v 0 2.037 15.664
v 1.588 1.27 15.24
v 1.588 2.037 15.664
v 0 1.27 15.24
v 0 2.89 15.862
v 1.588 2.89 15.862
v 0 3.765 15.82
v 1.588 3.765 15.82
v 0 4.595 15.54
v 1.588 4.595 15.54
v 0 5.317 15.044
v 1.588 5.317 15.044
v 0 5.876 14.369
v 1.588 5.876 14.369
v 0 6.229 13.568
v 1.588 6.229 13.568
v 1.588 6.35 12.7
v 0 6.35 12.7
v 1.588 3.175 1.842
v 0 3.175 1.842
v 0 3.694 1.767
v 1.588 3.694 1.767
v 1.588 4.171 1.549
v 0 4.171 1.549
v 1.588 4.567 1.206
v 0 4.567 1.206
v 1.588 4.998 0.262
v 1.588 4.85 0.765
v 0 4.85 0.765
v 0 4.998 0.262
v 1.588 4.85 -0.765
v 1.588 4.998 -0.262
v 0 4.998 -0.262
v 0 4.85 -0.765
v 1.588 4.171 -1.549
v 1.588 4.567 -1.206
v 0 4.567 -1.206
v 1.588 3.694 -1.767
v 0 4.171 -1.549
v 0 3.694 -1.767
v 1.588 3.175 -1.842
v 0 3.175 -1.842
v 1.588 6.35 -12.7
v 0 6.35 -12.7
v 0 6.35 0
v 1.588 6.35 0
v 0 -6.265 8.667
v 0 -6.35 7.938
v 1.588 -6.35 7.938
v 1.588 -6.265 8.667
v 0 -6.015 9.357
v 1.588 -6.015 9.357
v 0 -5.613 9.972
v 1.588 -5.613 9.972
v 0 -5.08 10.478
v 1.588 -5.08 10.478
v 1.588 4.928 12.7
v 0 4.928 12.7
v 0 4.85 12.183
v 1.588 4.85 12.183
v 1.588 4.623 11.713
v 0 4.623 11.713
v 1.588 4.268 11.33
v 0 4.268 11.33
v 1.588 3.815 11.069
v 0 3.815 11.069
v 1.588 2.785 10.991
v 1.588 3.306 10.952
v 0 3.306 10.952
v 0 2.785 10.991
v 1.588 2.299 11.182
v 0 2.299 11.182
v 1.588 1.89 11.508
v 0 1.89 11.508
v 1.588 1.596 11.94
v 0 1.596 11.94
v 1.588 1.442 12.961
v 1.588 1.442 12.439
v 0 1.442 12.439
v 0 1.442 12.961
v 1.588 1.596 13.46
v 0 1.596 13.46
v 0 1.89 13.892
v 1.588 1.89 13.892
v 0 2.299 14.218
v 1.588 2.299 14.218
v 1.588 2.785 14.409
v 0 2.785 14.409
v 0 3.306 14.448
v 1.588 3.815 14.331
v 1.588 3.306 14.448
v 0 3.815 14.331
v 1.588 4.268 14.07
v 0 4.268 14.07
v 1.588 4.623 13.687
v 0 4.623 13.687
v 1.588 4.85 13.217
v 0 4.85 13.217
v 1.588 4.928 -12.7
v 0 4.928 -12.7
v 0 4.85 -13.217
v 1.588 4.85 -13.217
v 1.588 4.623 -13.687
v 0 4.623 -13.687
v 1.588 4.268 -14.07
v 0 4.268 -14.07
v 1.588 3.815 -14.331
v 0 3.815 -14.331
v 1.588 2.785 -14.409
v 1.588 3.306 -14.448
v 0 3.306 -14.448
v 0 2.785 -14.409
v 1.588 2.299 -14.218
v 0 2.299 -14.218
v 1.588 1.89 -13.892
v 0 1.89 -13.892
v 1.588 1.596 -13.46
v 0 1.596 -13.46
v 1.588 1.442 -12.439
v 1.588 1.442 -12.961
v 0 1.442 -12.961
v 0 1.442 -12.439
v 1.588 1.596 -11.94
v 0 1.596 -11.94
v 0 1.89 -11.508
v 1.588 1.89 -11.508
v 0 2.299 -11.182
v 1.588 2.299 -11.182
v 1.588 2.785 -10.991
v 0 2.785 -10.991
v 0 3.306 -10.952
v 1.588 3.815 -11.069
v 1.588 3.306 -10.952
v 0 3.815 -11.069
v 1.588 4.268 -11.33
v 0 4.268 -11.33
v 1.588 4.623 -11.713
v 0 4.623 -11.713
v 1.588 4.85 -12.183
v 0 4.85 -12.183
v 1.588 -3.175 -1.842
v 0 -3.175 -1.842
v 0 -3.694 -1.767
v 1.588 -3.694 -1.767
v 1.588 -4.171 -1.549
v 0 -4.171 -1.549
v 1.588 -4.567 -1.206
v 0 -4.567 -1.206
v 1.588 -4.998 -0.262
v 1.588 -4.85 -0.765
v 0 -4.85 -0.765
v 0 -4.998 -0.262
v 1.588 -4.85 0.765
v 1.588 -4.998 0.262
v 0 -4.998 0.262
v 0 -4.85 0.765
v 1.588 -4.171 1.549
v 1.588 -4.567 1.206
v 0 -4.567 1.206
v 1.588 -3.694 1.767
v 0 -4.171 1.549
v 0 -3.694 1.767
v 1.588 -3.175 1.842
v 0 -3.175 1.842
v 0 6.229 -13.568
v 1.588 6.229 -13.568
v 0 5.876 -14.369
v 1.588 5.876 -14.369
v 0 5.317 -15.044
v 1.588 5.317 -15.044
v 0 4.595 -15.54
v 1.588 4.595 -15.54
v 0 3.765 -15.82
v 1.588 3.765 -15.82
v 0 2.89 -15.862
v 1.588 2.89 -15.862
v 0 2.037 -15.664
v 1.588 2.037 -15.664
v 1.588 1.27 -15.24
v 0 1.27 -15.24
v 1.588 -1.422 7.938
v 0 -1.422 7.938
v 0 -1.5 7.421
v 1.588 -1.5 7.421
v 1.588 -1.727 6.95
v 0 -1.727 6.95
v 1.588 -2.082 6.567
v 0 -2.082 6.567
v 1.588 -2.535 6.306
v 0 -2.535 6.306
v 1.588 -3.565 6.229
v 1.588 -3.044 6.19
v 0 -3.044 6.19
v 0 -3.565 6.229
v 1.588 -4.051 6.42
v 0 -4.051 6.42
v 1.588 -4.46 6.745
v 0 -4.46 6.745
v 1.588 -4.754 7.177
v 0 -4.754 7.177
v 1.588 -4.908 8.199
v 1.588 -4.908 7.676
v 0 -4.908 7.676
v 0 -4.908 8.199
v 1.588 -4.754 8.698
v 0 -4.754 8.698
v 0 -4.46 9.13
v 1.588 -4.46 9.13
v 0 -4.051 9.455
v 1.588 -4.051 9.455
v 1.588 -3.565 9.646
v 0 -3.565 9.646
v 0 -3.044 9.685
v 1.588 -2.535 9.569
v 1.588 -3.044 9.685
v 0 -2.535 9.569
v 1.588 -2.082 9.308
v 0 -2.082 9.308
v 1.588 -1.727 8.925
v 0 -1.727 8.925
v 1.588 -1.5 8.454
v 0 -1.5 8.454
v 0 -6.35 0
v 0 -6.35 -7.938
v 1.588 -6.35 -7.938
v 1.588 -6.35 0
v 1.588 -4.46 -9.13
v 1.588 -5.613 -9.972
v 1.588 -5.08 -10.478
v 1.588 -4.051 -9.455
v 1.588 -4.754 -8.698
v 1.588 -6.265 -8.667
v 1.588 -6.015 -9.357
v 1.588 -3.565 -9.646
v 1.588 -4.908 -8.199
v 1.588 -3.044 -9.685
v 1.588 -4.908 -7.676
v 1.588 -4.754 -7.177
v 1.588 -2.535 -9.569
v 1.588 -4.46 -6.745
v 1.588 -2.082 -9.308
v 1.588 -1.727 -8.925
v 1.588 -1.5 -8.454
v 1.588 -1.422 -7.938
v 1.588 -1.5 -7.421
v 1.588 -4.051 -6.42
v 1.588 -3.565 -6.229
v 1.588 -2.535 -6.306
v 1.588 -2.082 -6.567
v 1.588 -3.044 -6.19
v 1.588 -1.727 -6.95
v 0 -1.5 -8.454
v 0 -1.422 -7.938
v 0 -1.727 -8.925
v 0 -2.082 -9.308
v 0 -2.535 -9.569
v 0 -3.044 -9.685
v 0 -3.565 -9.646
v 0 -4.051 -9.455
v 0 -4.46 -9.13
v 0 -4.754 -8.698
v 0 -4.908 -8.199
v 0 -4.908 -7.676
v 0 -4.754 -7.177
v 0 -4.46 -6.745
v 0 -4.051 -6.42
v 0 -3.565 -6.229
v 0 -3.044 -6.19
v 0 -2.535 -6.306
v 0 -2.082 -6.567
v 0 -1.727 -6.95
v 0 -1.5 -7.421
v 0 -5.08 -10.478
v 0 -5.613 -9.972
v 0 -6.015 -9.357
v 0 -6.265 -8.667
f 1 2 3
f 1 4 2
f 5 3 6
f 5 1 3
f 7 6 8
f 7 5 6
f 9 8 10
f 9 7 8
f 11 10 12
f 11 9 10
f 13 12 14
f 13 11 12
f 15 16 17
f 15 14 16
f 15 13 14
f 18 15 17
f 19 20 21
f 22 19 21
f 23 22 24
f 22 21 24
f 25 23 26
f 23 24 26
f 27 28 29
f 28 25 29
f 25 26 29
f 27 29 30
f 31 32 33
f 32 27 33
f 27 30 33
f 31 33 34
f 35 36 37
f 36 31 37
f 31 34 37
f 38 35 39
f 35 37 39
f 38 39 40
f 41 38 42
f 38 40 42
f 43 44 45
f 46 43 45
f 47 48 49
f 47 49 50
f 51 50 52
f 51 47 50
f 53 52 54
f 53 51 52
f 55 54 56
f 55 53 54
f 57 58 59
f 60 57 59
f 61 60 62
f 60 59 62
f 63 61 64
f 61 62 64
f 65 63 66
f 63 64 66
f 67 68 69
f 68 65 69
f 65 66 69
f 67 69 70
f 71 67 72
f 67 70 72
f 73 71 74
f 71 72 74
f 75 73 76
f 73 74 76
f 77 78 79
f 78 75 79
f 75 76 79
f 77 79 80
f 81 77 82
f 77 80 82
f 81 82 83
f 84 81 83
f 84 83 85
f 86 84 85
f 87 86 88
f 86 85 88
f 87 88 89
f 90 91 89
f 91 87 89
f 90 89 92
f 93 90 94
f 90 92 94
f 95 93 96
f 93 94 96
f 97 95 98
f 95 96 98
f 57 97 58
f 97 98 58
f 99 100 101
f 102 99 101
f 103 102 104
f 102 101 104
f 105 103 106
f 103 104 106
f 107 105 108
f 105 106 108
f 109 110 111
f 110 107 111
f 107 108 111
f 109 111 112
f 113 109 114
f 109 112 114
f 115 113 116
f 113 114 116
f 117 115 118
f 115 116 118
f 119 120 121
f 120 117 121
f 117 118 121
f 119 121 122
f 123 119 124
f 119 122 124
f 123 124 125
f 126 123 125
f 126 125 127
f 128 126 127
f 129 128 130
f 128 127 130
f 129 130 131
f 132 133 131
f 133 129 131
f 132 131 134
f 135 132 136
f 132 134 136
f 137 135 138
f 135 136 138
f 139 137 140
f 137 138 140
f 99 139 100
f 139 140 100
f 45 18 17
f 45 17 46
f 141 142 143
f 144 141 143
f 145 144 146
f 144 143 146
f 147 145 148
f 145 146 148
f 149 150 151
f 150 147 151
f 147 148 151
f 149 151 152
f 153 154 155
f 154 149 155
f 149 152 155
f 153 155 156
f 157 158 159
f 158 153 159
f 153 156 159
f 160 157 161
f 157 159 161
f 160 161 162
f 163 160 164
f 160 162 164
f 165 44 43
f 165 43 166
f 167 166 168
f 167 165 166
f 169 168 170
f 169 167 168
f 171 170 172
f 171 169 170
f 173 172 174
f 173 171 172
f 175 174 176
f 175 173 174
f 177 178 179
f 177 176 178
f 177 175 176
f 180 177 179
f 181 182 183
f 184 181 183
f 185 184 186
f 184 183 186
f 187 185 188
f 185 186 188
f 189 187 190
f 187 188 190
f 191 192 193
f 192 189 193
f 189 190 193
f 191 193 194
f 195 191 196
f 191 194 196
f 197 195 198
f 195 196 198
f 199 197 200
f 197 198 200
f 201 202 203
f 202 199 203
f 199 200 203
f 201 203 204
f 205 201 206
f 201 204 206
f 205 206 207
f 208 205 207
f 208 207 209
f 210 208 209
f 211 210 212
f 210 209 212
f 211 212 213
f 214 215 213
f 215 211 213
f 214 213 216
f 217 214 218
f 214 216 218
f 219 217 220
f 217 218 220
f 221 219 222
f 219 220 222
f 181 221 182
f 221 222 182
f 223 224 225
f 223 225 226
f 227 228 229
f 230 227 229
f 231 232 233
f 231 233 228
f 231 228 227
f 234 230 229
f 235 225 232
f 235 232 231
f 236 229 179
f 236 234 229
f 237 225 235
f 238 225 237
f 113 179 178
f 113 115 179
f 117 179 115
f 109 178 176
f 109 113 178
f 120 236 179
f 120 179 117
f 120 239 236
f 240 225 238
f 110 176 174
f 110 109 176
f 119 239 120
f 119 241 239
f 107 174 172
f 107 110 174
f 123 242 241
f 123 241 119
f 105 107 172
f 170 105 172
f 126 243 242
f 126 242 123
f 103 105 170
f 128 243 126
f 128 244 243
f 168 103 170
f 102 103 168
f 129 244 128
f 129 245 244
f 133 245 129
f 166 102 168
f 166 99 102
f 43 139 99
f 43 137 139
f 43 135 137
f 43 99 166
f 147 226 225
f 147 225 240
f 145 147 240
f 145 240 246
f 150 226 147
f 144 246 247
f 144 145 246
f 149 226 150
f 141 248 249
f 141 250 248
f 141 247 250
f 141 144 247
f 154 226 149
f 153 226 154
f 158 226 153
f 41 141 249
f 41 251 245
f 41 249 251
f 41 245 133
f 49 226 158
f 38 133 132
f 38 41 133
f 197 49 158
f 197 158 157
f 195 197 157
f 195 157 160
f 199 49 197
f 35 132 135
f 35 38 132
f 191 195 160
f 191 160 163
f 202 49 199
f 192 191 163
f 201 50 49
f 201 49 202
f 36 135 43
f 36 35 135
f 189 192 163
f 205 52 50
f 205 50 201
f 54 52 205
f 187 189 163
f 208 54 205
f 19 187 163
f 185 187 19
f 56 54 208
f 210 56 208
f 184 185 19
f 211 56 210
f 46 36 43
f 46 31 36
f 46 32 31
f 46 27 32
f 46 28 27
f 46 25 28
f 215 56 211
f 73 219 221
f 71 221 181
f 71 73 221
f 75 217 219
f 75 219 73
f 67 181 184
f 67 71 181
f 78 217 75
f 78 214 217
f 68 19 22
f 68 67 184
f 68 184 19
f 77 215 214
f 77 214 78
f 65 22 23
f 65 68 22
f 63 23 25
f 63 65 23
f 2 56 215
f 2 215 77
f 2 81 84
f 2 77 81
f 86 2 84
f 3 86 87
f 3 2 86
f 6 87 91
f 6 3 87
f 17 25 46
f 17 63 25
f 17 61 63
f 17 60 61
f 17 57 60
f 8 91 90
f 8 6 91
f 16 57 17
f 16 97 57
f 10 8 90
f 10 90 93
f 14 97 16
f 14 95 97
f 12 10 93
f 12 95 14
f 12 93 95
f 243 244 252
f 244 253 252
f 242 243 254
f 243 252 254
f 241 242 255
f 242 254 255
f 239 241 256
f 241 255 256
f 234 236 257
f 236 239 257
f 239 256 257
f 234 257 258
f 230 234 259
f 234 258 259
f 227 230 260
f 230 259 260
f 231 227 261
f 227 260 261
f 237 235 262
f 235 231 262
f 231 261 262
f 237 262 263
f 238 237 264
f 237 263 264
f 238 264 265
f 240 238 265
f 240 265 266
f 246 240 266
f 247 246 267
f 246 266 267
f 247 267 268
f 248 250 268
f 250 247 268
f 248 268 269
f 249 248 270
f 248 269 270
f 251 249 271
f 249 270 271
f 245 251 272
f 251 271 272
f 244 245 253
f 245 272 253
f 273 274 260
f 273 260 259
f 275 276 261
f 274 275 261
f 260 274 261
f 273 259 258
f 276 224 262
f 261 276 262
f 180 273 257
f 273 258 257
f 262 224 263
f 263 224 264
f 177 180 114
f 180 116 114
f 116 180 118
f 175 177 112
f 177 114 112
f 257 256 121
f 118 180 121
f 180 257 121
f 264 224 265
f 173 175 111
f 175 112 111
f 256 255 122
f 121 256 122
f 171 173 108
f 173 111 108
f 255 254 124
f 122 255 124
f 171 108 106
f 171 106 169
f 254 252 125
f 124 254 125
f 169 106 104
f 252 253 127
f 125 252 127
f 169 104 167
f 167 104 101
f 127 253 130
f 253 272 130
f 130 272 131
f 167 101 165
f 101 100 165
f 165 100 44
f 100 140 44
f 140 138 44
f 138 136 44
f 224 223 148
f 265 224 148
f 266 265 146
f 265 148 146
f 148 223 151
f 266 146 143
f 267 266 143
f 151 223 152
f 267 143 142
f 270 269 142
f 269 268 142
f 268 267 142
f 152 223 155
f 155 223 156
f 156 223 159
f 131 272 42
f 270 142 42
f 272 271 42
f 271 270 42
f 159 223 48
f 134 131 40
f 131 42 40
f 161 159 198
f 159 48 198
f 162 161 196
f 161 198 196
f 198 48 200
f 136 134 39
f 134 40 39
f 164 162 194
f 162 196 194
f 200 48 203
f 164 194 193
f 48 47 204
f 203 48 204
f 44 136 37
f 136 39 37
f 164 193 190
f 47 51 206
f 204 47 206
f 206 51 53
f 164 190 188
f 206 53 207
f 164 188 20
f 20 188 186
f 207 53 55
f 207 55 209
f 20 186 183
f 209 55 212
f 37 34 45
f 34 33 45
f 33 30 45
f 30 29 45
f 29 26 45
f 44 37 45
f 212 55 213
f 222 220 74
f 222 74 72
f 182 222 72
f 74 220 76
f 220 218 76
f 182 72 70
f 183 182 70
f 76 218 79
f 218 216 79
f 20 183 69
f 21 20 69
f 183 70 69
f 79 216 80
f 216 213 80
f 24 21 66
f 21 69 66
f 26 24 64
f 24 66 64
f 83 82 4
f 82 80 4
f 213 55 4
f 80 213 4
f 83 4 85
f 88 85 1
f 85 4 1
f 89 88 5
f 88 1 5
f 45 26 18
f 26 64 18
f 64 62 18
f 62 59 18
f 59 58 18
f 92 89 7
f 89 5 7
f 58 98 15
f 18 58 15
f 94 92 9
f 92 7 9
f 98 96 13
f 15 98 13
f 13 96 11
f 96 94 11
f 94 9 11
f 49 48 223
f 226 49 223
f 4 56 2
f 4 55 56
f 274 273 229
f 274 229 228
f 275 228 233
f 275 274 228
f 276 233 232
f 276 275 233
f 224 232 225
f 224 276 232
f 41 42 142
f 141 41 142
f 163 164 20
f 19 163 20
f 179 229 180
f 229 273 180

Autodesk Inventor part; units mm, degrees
ref_plane "YZ Plane" through (0, 0, 0) normal (1, 0, 0) x (0, 1, 0)
ref_plane "XZ Plane" through (0, 0, 0) normal (0, 1, 0) x (-1, 0, 0)
ref_plane "XY Plane" through (0, 0, 0) normal (0, 0, 1) x (1, 0, 0)
sketch "Sketch1" plane through (0, 0, 0) normal (1, 0, 0) x (0, 1, 0)
  line L0 (3.175, 0) -> (-3.175, 0) construction
  line L1 (3.175, 1.5875) -> (-3.175, 1.5875) construction
  line L2 (-3.175, -1.5875) -> (3.175, -1.5875) construction
  arc A0 (3.175, -1.5875) -> (3.175, 1.5875) centre (3.175, 0) ccw construction
  arc A1 (-3.175, 1.5875) -> (-3.175, -1.5875) centre (-3.175, 0) ccw construction
  circle A2 centre (3.175, -12.7) radius 1.7526
  circle A3 centre (-3.175, -7.9375) radius 1.7526
  line L3 (3.175, -1.8415) -> (-3.175, -1.8415)
  arc A4 (-3.175, 1.8415) -> (-3.175, -1.8415) centre (-3.175, 0) ccw
  line L4 (-3.175, 1.8415) -> (3.175, 1.8415)
  arc A5 (3.175, -1.8415) -> (3.175, 1.8415) centre (3.175, 0) ccw
  arc A6 (1.27, -15.24) -> (6.35, -12.7) centre (3.175, -12.7) ccw
  arc A7 (-6.35, -7.9375) -> (-5.08, -10.4775) centre (-3.175, -7.9375) ccw
  line L5 (-5.08, -10.4775) -> (1.27, -15.24)
  line L6 (6.35, -12.7) -> (6.35, 0)
  line L7 (-6.35, -7.9375) -> (-6.35, 0)
  circle A8 centre (3.175, 12.7) radius 1.7526
  circle A9 centre (-3.175, 7.9375) radius 1.7526
  arc A10 (6.35, 12.7) -> (1.27, 15.24) centre (3.175, 12.7) ccw
  arc A11 (-5.08, 10.4775) -> (-6.35, 7.9375) centre (-3.175, 7.9375) ccw
  line L8 (-5.08, 10.4775) -> (1.27, 15.24)
  line L9 (6.35, 12.7) -> (6.35, 0)
  line L10 (-6.35, 7.9375) -> (-6.35, 0)
  point P0 (0, 0)
  dimension "d0" = 3.175
  dimension "d1" = 3.175
  dimension "d4" = 3.5052
  dimension "d5" = 12.7
  dimension "d6" = 3.175
  dimension "d7" = 3.5052
  dimension "d8" = 3.175
  dimension "d9" = 4.7625
  dimension "d10" = 0.254
  dimension "d11" = 6.35
  dimension "d12" = 6.35
extrude "Extrusion1" add sketch "Sketch1" along normal blind 1.5875
equation "\"d8\" = d6"
properties part number "Pin Cap - Slot" material "Aluminum 6061"
